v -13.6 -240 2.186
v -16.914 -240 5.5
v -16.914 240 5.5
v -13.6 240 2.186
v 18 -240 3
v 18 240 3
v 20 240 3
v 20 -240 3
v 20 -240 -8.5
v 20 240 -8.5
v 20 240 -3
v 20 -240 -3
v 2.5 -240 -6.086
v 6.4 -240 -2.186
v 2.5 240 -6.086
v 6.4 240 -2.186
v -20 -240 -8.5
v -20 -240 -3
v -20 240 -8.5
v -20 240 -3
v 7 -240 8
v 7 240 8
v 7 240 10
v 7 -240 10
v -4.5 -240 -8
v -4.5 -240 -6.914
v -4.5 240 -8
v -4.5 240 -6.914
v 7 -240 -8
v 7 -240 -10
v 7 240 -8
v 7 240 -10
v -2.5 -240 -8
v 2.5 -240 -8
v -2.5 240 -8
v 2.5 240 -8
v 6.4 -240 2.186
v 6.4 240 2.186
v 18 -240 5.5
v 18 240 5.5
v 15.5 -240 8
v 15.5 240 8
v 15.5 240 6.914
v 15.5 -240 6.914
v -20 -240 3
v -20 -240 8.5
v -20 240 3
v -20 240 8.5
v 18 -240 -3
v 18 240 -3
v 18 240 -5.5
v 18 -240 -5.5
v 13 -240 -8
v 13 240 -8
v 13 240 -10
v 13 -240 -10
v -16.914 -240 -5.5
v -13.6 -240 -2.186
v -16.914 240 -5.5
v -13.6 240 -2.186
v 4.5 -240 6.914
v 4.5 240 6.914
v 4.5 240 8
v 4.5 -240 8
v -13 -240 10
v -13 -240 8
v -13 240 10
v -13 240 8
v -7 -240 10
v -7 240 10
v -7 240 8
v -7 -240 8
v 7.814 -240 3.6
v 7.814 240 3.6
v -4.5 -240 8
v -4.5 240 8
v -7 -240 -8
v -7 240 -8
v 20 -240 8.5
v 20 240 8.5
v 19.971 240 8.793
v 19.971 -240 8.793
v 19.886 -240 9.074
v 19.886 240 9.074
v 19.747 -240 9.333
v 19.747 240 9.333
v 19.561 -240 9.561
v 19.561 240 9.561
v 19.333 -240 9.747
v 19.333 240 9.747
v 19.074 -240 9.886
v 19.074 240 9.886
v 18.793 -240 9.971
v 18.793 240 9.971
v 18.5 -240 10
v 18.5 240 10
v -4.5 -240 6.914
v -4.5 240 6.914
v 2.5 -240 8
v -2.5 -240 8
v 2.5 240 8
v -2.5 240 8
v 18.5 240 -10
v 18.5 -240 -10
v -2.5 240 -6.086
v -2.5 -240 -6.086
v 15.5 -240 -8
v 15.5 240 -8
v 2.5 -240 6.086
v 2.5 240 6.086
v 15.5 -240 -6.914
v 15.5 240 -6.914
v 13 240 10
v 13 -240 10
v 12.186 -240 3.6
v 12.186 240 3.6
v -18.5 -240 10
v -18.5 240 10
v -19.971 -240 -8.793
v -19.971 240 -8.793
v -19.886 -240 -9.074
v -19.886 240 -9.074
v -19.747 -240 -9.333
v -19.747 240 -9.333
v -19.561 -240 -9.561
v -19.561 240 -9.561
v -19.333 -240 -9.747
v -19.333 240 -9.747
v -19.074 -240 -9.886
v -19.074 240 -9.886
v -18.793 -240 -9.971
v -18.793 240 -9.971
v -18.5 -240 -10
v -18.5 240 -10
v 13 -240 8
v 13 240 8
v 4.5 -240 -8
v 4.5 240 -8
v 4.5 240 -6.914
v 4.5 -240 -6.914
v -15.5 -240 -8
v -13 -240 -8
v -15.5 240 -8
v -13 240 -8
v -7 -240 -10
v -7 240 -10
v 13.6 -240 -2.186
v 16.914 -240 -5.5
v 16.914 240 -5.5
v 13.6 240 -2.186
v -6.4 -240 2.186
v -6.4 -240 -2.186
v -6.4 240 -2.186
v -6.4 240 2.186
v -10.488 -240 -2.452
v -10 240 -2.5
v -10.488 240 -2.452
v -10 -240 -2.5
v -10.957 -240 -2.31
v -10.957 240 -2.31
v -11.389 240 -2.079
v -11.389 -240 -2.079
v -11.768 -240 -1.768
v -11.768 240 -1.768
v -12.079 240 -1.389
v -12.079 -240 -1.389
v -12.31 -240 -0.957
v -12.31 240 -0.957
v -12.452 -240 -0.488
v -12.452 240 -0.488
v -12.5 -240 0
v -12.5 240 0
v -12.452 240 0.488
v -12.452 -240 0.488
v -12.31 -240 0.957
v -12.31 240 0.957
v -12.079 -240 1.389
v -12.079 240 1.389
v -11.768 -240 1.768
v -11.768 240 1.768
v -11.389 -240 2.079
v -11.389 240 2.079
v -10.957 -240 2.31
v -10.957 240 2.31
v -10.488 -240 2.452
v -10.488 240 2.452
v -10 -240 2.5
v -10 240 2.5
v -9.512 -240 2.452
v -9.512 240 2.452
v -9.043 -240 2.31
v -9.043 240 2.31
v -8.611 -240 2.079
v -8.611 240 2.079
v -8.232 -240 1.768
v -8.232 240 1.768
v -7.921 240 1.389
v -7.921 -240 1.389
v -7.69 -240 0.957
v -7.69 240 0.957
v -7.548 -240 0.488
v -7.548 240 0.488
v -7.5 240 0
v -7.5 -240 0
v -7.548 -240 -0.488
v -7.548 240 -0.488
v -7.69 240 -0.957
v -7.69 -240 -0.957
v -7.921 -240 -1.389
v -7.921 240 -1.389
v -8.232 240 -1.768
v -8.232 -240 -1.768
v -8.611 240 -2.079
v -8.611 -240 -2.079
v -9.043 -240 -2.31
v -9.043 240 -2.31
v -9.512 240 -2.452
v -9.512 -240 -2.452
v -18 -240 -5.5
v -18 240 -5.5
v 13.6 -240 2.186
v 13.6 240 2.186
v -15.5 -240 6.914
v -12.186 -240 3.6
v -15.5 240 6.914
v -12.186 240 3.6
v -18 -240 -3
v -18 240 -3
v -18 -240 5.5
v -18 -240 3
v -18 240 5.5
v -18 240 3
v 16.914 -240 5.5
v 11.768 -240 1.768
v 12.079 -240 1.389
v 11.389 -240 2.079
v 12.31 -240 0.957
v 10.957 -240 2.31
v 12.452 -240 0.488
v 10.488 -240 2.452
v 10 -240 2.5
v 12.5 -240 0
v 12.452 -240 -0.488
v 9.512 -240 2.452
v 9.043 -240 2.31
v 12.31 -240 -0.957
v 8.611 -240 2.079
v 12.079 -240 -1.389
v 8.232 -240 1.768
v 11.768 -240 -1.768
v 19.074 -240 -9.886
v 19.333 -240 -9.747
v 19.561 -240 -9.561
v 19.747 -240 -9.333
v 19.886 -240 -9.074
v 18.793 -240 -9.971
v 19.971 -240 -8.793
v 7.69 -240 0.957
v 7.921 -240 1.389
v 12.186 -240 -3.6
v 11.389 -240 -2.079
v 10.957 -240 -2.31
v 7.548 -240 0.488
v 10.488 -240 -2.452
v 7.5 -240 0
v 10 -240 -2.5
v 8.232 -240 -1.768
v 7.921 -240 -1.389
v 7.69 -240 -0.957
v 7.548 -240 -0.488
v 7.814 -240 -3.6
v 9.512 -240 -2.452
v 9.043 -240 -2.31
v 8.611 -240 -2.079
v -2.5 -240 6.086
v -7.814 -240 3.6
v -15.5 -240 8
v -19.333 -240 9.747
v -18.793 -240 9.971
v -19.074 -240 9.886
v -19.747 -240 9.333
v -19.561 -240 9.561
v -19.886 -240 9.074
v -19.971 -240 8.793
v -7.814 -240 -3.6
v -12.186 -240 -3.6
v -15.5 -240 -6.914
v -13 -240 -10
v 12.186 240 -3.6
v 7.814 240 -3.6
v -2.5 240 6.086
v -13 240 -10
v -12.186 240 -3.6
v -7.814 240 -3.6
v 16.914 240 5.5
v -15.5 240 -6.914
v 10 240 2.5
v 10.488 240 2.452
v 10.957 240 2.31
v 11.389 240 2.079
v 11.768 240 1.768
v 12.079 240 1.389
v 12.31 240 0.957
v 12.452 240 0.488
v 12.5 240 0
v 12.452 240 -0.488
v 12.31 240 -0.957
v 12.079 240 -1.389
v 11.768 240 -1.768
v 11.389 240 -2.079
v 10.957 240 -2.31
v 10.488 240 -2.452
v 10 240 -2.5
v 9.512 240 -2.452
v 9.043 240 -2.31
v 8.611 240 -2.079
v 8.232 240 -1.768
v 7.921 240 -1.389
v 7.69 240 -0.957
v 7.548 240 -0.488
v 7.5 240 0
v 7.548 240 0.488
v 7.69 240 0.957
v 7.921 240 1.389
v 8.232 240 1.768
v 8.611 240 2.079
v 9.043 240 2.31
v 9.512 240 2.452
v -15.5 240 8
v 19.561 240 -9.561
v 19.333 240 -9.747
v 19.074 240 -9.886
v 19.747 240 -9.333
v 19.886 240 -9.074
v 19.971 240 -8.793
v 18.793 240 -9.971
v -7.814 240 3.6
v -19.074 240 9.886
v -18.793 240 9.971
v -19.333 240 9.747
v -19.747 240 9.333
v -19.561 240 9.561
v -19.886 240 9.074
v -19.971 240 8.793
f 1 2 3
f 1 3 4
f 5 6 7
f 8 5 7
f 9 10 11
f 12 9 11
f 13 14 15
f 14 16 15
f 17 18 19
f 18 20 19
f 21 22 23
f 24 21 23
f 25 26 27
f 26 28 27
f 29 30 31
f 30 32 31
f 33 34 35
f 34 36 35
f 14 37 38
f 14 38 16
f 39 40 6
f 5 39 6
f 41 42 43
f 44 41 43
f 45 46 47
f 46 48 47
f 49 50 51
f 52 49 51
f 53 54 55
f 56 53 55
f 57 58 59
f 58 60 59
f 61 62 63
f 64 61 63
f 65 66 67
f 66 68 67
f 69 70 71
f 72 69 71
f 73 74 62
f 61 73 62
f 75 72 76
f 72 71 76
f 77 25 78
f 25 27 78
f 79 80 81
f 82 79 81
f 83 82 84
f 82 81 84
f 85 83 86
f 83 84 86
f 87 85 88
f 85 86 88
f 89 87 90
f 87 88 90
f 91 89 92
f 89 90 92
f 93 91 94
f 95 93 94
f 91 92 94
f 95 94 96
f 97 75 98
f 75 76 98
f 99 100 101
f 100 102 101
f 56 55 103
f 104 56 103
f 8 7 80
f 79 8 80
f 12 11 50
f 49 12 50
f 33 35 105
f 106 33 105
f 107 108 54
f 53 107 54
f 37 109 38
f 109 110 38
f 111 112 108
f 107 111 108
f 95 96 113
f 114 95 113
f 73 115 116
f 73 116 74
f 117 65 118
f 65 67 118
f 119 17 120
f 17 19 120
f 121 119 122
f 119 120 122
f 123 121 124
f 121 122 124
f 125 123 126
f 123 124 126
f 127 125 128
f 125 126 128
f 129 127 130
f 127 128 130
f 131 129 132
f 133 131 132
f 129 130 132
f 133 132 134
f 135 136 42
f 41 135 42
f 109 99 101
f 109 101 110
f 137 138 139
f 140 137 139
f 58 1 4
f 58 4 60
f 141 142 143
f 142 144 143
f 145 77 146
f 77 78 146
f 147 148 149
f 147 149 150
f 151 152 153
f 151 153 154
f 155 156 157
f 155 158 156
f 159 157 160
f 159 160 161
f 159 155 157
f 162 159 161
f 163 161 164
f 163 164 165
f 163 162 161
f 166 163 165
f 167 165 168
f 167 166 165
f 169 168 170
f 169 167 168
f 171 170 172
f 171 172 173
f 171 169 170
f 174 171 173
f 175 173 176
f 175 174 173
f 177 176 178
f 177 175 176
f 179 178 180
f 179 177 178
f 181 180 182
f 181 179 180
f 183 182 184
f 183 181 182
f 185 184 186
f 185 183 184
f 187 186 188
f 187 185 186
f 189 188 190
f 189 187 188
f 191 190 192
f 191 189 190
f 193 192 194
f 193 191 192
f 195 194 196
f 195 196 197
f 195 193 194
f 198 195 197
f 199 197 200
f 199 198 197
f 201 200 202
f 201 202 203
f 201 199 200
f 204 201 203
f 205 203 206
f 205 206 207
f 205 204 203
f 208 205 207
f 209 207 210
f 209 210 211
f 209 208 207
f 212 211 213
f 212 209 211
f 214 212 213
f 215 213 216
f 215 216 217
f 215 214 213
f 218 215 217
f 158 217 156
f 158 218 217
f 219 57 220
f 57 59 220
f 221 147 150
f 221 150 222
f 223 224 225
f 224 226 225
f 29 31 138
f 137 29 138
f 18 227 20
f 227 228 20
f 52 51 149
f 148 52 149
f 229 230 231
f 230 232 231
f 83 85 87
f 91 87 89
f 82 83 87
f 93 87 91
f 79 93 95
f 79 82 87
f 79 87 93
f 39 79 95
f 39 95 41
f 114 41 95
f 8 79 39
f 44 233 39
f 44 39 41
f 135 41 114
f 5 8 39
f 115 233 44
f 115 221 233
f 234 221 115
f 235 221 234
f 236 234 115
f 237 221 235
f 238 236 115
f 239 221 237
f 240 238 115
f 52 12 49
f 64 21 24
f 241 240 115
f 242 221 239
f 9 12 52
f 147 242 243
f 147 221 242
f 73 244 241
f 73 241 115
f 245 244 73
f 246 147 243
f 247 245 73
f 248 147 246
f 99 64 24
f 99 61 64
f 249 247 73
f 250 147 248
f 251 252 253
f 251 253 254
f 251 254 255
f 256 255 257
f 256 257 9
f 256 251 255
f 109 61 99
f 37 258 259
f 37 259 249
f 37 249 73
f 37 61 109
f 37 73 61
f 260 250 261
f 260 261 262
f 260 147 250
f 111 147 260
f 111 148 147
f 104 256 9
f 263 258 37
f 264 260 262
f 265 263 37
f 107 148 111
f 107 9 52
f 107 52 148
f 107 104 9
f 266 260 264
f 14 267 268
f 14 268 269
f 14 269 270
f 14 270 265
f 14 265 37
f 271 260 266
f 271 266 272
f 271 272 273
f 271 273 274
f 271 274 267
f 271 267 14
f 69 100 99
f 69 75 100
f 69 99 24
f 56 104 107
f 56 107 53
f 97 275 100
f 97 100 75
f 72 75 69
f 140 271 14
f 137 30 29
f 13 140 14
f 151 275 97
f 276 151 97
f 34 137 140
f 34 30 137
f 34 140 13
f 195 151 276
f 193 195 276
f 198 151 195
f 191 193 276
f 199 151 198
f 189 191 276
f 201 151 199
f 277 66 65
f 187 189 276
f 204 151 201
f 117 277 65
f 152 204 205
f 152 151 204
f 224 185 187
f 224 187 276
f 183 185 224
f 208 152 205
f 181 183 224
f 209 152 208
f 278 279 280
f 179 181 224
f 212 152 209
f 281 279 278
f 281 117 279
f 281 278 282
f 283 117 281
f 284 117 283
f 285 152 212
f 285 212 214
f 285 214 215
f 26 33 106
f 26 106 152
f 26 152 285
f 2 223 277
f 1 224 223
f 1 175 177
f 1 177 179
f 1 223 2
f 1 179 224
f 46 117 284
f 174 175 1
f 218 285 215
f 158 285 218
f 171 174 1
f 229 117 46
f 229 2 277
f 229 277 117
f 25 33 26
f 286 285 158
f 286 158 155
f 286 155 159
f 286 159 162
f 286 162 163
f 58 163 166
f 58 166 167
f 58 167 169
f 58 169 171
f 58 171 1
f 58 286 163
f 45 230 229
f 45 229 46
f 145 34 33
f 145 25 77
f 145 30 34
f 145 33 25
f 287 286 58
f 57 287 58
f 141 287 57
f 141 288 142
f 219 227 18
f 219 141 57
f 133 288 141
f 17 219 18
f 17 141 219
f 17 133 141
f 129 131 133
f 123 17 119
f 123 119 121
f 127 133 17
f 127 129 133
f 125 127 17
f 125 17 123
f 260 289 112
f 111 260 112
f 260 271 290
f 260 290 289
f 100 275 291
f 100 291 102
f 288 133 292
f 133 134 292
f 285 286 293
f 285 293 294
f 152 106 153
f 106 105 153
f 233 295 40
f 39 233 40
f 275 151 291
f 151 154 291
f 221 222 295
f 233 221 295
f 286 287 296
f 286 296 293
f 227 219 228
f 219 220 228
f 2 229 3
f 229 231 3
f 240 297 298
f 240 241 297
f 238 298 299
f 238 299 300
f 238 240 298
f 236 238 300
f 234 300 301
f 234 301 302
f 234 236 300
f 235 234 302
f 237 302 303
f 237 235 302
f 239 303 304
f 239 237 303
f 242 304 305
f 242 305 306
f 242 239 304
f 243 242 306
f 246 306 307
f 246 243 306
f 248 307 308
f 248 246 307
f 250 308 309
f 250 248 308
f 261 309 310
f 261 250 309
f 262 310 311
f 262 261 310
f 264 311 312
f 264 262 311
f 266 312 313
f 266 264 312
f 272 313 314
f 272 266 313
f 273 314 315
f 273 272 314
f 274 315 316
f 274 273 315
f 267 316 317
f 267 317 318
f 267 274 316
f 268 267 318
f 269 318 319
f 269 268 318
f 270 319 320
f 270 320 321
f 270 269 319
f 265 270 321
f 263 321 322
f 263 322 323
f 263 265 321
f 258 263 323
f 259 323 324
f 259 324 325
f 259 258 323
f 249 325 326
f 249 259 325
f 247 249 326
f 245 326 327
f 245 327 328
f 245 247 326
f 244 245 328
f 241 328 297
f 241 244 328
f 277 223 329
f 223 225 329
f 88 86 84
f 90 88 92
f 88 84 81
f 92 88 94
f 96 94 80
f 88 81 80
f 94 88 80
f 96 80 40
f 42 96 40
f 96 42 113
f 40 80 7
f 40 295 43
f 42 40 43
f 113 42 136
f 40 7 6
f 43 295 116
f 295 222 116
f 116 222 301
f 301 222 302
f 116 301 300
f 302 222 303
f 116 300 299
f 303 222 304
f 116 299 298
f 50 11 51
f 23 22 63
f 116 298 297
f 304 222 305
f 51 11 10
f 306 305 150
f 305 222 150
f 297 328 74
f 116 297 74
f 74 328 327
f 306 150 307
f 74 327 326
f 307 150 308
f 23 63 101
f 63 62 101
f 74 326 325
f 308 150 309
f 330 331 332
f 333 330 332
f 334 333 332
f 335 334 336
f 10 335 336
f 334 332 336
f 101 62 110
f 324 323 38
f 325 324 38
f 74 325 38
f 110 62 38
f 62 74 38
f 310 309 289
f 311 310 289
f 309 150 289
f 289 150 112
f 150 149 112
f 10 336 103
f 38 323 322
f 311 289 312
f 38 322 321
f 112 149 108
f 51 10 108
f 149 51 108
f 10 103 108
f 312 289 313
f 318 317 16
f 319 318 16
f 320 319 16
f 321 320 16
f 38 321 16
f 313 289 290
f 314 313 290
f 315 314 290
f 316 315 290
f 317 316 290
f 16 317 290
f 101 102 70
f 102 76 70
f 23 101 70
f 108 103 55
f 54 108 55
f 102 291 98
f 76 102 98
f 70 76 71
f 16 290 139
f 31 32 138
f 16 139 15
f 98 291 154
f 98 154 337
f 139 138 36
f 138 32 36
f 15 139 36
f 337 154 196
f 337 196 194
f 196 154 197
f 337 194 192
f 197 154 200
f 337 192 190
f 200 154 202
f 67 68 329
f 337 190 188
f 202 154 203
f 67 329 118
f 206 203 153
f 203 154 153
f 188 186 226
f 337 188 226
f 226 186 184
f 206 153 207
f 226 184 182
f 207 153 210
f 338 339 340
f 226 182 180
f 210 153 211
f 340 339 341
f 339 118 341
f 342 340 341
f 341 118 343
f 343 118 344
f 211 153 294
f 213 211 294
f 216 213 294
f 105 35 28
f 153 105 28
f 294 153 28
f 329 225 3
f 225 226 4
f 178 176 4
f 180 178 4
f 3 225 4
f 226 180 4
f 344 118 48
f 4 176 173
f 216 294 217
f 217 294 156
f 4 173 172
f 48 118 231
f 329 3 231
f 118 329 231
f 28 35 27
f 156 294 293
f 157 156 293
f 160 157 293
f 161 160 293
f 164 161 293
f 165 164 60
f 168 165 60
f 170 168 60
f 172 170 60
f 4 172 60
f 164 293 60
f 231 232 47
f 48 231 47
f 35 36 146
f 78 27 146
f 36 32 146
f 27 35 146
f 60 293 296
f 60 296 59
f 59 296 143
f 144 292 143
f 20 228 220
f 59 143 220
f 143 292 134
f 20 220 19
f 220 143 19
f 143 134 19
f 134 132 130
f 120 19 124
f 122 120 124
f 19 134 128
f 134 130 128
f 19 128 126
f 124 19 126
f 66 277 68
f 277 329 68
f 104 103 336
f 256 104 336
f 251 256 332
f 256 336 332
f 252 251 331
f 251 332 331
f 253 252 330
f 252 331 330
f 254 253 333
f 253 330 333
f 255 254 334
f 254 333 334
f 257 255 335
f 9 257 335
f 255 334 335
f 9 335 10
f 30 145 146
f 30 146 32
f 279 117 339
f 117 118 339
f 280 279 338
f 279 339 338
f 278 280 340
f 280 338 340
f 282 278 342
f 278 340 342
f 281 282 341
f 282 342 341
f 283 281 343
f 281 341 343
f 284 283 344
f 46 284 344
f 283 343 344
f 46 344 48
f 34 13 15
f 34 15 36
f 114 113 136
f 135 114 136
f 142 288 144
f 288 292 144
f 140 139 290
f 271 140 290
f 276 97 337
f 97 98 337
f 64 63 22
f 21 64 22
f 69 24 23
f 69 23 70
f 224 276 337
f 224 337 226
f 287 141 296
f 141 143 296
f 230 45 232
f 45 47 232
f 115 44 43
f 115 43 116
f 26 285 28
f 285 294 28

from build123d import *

# Parameters (mm, degrees)
SKETCH1_R           = 2.5
BOSS_EXTRUDE1_DEPTH = 240


with BuildPart() as part:
    # Sketch1 → Boss-Extrude1 (new, symmetric)
    with BuildSketch(Plane(origin=(0, 0, 0), x_dir=(1, 0, 0), z_dir=(0, 1, 0))):
        with BuildLine():
            Line((-7, -10), (-7, -8))
            Line((-7, -8), (-4.5, -8))
            Line((-4.5, -8), (-4.5, -6.914213562))
            Line((-4.5, -6.914213562), (-7.814213562, -3.6))
            Line((-7.814213562, -3.6), (-12.185786438, -3.6))
            Line((-12.185786438, -3.6), (-15.5, -6.914213562))
            Line((-15.5, -6.914213562), (-15.5, -8))
            Line((-15.5, -8), (-13, -8))
            Line((-13, -8), (-13, -10))
            Line((-13, -10), (-18.5, -10))
            ThreePointArc((-18.5, -10), (-19.560660172, -9.560660172), (-20, -8.5))
            Line((-20, -8.5), (-20, -3))
            Line((-20, -3), (-18, -3))
            Line((-18, -3), (-18, -5.5))
            Line((-18, -5.5), (-16.914213562, -5.5))
            Line((-16.914213562, -5.5), (-13.6, -2.185786438))
            Line((-13.6, -2.185786438), (-13.6, 2.185786438))
            Line((-13.6, 2.185786438), (-16.914213562, 5.5))
            Line((-16.914213562, 5.5), (-18, 5.5))
            Line((-18, 5.5), (-18, 3))
            Line((-18, 3), (-20, 3))
            Line((-20, 3), (-20, 8.5))
            ThreePointArc((-20, 8.5), (-19.560660172, 9.560660172), (-18.5, 10))
            Line((-18.5, 10), (-13, 10))
            Line((-13, 10), (-13, 8))
            Line((-13, 8), (-15.5, 8))
            Line((-15.5, 8), (-15.5, 6.914213562))
            Line((-15.5, 6.914213562), (-12.185786438, 3.6))
            Line((-12.185786438, 3.6), (-7.814213562, 3.6))
            Line((-7.814213562, 3.6), (-4.5, 6.914213562))
            Line((-4.5, 6.914213562), (-4.5, 8))
            Line((-4.5, 8), (-7, 8))
            Line((-7, 8), (-7, 10))
            Line((-7, 10), (7, 10))
            Line((7, 10), (7, 8))
            Line((7, 8), (4.5, 8))
            Line((4.5, 8), (4.5, 6.914213562))
            Line((4.5, 6.914213562), (7.814213562, 3.6))
            Line((7.814213562, 3.6), (12.185786438, 3.6))
            Line((12.185786438, 3.6), (15.5, 6.914213562))
            Line((15.5, 6.914213562), (15.5, 8))
            Line((15.5, 8), (13, 8))
            Line((13, 8), (13, 10))
            Line((13, 10), (18.5, 10))
            ThreePointArc((18.5, 10), (19.560660172, 9.560660172), (20, 8.5))
            Line((20, 8.5), (20, 3))
            Line((20, 3), (18, 3))
            Line((18, 3), (18, 5.5))
            Line((18, 5.5), (16.914213562, 5.5))
            Line((16.914213562, 5.5), (13.6, 2.185786438))
            Line((13.6, 2.185786438), (13.6, -2.185786438))
            Line((13.6, -2.185786438), (16.914213562, -5.5))
            Line((16.914213562, -5.5), (18, -5.5))
            Line((18, -5.5), (18, -3))
            Line((18, -3), (20, -3))
            Line((20, -3), (20, -8.5))
            ThreePointArc((20, -8.5), (19.560660172, -9.560660172), (18.5, -10))
            Line((18.5, -10), (13, -10))
            Line((13, -10), (13, -8))
            Line((13, -8), (15.5, -8))
            Line((15.5, -8), (15.5, -6.914213562))
            Line((15.5, -6.914213562), (12.185786438, -3.6))
            Line((12.185786438, -3.6), (7.814213562, -3.6))
            Line((7.814213562, -3.6), (4.5, -6.914213562))
            Line((4.5, -6.914213562), (4.5, -8))
            Line((4.5, -8), (7, -8))
            Line((7, -8), (7, -10))
            Line((7, -10), (-7, -10))
        make_face()
        with Locations((-10, 0)):
            Circle(SKETCH1_R, mode=Mode.SUBTRACT)
        with Locations((10, 0)):
            Circle(SKETCH1_R, mode=Mode.SUBTRACT)
        Polygon((-2.5, 8), (-2.5, 6.085786438), (-6.4, 2.185786438), (-6.4, -2.185786438), (-2.5, -6.085786438), (-2.5, -8), (2.5, -8), (2.5, -6.085786438), (6.4, -2.185786438), (6.4, 2.185786438), (2.5, 6.085786438), (2.5, 8), align=None, mode=Mode.SUBTRACT)
    extrude(amount=BOSS_EXTRUDE1_DEPTH, both=True)


solid = part.part
